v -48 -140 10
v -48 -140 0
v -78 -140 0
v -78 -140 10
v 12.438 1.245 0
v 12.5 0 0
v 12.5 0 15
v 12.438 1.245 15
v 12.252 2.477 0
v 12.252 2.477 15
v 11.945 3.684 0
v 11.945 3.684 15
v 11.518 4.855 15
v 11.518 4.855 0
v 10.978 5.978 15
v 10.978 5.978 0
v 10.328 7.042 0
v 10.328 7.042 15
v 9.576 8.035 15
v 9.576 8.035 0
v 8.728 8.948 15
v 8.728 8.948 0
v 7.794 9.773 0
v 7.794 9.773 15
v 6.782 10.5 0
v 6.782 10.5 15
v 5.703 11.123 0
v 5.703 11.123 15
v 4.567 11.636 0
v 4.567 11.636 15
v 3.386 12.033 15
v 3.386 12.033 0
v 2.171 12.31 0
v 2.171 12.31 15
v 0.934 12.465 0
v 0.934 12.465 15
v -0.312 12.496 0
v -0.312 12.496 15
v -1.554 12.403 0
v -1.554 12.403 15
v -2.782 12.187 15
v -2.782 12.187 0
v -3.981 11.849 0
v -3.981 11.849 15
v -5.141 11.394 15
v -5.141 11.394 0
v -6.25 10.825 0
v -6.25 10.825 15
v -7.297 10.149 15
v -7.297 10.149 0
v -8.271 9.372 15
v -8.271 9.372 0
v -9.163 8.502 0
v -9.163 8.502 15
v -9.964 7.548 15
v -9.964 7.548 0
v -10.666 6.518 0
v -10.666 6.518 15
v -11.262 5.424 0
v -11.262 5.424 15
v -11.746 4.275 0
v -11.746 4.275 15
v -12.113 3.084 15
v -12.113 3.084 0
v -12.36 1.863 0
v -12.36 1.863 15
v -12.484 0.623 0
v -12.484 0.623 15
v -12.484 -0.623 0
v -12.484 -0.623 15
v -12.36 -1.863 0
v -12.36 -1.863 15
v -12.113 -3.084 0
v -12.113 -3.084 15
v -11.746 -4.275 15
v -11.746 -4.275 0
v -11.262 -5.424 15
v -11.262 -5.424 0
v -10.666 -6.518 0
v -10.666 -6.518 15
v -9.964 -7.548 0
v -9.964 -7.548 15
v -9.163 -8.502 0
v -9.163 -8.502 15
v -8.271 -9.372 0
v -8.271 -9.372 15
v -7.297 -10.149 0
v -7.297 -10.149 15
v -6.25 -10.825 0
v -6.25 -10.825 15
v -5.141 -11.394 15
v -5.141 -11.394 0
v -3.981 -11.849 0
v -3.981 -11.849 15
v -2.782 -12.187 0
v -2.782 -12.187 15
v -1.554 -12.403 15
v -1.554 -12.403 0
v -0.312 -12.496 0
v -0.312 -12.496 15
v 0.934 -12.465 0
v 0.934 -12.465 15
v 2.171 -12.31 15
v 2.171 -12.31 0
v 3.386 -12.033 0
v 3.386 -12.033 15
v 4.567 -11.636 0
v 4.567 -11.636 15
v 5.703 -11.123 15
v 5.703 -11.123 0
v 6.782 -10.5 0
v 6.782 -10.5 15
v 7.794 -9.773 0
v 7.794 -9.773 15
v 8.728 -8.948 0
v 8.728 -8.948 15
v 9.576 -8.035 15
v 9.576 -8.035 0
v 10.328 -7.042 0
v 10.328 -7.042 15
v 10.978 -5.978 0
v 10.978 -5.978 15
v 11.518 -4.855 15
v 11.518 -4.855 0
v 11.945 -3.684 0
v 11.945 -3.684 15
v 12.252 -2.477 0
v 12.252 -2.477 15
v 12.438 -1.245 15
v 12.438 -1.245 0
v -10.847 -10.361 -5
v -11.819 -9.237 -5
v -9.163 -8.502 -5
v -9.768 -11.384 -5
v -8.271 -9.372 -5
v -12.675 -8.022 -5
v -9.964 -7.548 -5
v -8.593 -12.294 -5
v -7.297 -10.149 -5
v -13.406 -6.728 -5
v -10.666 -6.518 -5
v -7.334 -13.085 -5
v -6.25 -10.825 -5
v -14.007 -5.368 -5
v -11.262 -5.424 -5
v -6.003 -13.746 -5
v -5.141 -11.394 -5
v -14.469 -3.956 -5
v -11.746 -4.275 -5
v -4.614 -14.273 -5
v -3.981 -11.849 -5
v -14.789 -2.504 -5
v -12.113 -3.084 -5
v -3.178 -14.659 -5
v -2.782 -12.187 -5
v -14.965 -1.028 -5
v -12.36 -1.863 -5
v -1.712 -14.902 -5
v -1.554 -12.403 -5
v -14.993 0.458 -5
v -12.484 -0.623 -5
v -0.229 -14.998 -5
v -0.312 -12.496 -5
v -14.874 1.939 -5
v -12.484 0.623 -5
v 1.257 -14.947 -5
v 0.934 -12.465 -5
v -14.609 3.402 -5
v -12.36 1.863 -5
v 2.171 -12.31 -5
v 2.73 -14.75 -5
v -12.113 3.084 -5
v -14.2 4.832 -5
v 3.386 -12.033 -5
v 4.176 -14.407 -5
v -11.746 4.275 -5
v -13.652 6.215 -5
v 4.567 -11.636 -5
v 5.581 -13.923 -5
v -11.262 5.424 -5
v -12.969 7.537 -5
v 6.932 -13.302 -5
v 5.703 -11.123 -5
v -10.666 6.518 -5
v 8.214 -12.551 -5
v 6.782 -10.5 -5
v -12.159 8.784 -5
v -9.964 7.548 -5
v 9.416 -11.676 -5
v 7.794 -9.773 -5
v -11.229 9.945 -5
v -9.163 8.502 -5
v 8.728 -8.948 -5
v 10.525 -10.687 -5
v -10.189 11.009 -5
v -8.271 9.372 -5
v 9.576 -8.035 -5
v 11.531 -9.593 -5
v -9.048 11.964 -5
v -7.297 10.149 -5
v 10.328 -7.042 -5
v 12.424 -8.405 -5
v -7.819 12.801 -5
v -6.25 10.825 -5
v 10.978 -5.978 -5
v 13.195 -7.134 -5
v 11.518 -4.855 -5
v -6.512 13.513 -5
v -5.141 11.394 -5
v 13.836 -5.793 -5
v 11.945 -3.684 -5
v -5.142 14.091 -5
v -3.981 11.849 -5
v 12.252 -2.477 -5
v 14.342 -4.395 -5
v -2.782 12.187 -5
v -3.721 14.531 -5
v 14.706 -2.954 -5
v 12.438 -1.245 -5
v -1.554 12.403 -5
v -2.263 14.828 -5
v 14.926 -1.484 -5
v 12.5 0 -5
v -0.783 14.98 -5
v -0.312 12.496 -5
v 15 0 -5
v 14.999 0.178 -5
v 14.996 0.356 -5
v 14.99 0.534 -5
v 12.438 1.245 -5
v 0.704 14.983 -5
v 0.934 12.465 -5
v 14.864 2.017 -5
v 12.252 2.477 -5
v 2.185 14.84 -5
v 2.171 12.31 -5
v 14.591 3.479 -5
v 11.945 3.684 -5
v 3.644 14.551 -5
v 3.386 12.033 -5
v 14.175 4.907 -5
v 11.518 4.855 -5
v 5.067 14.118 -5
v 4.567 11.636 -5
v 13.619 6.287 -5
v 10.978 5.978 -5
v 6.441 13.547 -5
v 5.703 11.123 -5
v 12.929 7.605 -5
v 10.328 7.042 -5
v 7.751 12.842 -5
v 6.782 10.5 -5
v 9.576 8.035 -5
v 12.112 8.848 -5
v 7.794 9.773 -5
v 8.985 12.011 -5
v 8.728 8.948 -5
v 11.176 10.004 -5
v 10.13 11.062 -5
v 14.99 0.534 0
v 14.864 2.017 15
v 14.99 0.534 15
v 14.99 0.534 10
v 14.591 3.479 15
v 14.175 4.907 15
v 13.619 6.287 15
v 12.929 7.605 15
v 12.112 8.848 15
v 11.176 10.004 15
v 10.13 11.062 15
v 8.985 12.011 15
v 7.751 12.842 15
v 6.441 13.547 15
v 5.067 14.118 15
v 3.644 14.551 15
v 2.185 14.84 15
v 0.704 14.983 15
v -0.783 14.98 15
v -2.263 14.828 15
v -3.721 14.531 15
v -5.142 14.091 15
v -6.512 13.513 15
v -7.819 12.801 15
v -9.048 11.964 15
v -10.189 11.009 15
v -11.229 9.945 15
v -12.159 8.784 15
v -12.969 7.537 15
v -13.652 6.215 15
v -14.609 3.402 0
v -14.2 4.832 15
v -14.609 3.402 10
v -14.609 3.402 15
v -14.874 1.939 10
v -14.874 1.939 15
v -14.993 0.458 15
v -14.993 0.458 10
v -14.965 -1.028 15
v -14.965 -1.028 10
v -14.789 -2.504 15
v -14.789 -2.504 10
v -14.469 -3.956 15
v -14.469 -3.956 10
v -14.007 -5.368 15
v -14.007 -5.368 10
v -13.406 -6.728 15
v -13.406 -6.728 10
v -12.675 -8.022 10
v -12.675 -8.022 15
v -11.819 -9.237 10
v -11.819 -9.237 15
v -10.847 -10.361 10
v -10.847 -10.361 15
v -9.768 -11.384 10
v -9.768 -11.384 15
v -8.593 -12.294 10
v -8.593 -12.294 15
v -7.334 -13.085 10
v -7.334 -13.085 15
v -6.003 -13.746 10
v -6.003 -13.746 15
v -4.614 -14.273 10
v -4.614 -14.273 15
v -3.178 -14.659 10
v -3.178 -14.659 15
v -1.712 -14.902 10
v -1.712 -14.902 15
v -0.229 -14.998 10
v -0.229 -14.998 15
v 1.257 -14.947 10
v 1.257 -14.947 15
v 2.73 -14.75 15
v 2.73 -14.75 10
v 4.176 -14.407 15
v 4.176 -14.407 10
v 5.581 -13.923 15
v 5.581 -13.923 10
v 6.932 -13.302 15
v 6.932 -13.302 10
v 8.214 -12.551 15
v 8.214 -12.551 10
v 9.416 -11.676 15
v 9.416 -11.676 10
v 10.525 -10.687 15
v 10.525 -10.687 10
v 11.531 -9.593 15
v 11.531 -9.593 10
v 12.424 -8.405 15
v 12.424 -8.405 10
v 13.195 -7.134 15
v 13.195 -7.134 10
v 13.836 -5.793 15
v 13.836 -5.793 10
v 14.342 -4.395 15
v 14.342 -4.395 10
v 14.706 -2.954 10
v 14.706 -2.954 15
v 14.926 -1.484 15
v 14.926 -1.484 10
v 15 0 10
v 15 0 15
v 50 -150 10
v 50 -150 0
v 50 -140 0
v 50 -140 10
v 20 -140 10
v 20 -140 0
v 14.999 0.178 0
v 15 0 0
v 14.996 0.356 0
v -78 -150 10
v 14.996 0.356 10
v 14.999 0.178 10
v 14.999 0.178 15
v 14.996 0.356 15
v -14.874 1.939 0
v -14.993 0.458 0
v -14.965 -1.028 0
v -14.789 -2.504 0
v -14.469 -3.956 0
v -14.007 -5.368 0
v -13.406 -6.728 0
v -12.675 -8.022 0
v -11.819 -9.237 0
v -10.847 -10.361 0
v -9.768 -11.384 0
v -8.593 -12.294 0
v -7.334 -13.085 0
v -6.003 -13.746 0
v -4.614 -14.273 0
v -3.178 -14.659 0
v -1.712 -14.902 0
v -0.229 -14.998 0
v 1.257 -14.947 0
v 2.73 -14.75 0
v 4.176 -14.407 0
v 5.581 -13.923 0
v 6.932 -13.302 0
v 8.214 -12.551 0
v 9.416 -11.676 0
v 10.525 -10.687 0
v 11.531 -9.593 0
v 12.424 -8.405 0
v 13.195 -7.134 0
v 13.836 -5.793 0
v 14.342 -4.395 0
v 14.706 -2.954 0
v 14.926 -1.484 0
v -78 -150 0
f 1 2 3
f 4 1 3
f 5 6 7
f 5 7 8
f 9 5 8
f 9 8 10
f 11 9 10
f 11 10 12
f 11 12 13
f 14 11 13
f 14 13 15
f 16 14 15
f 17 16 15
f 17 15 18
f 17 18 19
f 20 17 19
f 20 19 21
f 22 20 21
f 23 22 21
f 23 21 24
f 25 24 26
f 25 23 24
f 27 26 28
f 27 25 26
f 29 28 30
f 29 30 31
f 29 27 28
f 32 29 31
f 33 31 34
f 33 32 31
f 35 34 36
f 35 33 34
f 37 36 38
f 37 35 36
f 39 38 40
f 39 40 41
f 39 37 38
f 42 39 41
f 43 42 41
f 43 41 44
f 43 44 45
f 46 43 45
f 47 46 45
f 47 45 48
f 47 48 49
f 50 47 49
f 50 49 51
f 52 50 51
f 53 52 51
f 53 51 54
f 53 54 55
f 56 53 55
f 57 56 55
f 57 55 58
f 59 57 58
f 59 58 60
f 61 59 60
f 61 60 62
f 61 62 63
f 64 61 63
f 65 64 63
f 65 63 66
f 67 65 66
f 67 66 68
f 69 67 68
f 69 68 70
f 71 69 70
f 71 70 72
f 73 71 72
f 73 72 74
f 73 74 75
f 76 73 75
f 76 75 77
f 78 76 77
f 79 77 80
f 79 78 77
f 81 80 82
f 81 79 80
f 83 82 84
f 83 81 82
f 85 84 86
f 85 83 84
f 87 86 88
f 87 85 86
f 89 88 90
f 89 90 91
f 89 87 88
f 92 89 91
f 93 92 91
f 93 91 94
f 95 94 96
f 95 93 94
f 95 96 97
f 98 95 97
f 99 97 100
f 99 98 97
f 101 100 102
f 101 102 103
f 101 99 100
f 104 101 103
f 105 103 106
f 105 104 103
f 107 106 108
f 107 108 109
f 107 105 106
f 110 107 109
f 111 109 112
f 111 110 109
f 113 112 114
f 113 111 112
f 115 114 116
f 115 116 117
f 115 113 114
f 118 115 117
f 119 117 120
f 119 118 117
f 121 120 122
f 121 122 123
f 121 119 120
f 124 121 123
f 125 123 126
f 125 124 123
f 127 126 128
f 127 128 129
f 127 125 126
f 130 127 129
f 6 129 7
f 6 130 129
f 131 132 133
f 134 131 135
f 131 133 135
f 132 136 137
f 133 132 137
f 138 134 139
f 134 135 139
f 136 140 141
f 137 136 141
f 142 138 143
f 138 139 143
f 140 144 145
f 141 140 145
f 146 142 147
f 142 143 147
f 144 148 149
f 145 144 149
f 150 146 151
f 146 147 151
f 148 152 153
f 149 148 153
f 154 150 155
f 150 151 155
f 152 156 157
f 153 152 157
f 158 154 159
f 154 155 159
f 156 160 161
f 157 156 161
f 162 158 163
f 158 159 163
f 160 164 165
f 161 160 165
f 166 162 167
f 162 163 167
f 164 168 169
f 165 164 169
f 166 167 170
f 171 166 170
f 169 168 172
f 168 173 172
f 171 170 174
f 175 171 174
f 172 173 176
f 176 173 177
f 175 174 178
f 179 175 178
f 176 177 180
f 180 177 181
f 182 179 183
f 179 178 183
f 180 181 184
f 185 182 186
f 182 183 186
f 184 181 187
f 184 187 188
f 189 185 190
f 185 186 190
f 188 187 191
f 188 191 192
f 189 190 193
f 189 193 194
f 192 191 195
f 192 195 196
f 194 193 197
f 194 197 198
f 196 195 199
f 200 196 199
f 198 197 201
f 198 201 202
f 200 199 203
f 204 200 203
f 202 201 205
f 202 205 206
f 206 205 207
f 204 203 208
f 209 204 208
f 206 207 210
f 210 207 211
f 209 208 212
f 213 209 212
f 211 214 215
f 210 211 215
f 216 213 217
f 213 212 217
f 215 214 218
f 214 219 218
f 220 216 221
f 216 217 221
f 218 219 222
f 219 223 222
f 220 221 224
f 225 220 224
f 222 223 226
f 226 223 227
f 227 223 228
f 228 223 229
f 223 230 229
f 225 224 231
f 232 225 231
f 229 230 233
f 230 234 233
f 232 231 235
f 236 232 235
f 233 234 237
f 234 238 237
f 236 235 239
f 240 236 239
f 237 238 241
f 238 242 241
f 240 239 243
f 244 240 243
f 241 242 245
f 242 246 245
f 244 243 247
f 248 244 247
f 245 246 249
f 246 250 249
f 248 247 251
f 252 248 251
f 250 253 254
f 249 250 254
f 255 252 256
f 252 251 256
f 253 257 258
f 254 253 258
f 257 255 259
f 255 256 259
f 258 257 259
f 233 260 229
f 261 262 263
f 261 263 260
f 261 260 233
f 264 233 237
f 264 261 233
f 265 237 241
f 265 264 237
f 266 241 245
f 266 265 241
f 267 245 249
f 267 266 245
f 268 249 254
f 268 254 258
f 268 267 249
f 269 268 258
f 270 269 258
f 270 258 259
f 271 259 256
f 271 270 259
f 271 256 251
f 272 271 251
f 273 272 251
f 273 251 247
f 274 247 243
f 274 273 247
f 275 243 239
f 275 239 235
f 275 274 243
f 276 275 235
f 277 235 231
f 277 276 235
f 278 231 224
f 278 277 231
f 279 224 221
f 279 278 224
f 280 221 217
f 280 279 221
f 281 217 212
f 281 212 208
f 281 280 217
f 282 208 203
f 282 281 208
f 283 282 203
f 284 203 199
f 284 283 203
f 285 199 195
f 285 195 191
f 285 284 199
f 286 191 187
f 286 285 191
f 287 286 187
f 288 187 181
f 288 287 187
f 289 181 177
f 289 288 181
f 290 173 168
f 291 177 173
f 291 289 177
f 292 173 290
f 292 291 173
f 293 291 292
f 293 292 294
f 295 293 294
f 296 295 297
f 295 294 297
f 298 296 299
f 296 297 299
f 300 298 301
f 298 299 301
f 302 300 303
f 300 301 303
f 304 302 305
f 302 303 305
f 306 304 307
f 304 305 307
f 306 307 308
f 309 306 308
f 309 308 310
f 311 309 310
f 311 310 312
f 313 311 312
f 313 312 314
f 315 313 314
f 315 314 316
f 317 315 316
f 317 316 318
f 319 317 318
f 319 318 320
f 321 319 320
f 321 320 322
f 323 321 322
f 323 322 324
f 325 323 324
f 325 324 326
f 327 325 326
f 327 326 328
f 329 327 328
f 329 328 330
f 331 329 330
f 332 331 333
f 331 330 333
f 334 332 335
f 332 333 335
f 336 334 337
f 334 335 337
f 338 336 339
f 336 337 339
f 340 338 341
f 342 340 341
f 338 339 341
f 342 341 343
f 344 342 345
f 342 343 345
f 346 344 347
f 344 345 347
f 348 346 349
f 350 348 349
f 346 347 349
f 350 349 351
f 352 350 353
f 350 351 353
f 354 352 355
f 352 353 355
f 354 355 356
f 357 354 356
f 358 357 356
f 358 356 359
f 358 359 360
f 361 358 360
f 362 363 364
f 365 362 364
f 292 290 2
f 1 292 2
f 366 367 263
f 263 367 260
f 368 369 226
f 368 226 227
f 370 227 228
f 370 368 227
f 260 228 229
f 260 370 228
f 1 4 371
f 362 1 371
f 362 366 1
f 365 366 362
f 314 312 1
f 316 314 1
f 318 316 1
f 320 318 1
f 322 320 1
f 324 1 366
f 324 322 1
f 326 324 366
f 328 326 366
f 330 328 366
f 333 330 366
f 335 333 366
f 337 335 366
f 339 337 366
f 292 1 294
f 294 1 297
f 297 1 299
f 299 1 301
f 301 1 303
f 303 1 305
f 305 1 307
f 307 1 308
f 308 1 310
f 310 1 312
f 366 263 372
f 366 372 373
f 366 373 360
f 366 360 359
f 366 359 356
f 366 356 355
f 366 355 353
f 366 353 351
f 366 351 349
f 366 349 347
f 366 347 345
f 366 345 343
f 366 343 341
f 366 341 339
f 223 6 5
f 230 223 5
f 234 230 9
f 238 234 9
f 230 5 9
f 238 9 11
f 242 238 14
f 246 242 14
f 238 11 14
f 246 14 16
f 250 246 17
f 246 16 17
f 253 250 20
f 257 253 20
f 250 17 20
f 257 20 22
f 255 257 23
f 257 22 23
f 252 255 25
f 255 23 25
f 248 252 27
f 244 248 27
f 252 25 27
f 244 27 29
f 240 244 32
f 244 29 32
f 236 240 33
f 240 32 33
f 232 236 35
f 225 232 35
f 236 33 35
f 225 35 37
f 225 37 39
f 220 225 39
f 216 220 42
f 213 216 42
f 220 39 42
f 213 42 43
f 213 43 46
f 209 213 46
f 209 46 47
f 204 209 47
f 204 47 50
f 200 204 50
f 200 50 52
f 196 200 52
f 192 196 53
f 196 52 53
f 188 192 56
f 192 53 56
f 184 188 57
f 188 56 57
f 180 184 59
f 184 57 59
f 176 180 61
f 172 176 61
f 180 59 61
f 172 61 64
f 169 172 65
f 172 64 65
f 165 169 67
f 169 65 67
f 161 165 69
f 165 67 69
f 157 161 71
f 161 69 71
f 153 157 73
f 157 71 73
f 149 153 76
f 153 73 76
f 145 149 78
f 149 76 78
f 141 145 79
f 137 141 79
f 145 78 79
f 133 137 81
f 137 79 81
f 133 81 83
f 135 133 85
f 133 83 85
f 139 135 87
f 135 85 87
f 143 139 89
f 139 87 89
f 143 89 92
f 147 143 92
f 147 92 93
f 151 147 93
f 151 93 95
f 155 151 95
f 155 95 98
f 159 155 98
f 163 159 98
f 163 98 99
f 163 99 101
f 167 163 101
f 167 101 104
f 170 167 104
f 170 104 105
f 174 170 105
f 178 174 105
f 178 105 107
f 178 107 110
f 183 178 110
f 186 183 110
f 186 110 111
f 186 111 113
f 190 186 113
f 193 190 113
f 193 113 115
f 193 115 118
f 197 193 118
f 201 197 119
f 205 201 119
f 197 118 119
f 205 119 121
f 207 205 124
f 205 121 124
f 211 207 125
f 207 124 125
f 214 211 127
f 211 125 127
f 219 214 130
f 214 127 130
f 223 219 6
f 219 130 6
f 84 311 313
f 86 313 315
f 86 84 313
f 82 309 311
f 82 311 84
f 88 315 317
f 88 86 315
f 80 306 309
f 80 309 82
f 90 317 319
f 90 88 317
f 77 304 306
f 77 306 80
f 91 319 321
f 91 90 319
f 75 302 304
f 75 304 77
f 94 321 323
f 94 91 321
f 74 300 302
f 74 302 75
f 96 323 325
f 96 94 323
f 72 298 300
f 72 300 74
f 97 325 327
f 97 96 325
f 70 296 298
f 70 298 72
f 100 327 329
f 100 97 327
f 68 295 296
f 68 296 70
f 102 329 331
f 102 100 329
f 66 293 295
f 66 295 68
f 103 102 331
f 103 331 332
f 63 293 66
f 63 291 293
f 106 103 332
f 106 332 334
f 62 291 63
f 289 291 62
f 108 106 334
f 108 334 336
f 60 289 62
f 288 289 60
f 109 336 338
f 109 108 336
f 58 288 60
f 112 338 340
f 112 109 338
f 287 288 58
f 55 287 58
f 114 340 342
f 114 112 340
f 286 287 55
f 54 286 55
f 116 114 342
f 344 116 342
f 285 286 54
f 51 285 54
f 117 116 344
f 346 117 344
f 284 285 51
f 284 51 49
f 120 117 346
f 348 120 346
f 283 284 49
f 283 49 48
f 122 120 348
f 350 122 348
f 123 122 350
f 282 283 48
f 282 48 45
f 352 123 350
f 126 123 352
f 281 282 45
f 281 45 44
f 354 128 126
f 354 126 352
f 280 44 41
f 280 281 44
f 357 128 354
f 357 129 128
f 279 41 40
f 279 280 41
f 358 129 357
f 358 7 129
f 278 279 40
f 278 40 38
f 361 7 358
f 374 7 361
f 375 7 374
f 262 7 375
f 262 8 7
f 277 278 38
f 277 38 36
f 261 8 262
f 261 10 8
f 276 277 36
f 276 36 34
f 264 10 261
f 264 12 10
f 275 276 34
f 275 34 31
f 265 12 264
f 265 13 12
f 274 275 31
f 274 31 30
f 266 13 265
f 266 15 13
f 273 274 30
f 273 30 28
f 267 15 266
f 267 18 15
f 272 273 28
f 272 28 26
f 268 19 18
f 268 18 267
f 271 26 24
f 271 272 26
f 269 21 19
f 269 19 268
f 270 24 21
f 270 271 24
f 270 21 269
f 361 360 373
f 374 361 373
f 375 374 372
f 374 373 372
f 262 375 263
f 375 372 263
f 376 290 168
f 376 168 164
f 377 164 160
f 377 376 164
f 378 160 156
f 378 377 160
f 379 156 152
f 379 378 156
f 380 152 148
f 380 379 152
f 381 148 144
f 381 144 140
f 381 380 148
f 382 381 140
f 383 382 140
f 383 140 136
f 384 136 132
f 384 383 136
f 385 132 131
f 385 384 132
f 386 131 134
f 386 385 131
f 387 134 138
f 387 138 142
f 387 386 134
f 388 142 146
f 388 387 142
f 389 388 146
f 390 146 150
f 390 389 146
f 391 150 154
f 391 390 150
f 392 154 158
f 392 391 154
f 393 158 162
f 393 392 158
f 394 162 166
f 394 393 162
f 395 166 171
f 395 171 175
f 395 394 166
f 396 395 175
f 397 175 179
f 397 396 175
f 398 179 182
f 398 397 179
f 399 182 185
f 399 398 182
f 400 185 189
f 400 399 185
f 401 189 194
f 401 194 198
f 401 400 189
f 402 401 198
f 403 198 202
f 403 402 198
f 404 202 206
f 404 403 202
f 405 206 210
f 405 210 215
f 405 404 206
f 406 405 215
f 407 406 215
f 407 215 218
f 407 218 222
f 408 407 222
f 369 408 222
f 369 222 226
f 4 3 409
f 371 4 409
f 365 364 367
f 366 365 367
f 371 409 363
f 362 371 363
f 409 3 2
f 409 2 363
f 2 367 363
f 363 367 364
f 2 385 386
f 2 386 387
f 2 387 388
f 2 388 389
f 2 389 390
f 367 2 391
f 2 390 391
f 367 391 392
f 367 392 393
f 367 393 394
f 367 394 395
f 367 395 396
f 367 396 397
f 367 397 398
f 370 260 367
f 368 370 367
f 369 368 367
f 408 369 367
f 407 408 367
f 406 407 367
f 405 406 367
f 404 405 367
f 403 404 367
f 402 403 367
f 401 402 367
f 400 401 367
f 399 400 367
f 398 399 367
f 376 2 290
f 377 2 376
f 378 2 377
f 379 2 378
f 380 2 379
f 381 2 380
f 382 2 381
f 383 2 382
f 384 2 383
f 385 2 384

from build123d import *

# Parameters (mm, degrees)
F0_R          = 12.5
F1_DEPTH      = 10
F2_DEPTH      = 15
F2_DEPTH_BACK = 5


with BuildPart() as f1:
    # F0 (on Top) → F1 (new body)
    with BuildSketch(Plane.XY):
        with BuildLine():
            ThreePointArc((14.990479, 0.534354), (14.99762, 0.267219), (15, 0))
            ThreePointArc((15, 0), (-1.712048, -14.901976), (-14.609185, 3.401721))
            Line((-14.609185, 3.401721), (-48, -140))
            Line((-48, -140), (-78, -140))
            Line((-78, -140), (-78, -150))
            Line((-78, -150), (50, -150))
            Line((50, -150), (50, -140))
            Line((50, -140), (20, -140))
            Line((20, -140), (14.990479, 0.534354))
        make_face()
        with BuildLine():
            ThreePointArc((-14.609185, 3.401721), (-1.712048, -14.901976), (15, 0))
            ThreePointArc((15, 0), (14.99762, 0.267219), (14.990479, 0.534354))
            ThreePointArc((14.990479, 0.534354), (1.446304, 14.930111), (-14.609185, 3.401721))
        make_face()
        Circle(F0_R, mode=Mode.SUBTRACT)
    extrude(amount=F1_DEPTH)

    # F0 (on Top) → F2 (join, two sides)
    with BuildSketch(Plane.XY) as f2_sk:
        with BuildLine():
            ThreePointArc((-14.609185, 3.401721), (-1.712048, -14.901976), (15, 0))
            ThreePointArc((15, 0), (14.99762, 0.267219), (14.990479, 0.534354))
            ThreePointArc((14.990479, 0.534354), (1.446304, 14.930111), (-14.609185, 3.401721))
        make_face()
        Circle(F0_R, mode=Mode.SUBTRACT)
    extrude(amount=F2_DEPTH)
    extrude(f2_sk.sketch, amount=-F2_DEPTH_BACK)


solid = f1.part
